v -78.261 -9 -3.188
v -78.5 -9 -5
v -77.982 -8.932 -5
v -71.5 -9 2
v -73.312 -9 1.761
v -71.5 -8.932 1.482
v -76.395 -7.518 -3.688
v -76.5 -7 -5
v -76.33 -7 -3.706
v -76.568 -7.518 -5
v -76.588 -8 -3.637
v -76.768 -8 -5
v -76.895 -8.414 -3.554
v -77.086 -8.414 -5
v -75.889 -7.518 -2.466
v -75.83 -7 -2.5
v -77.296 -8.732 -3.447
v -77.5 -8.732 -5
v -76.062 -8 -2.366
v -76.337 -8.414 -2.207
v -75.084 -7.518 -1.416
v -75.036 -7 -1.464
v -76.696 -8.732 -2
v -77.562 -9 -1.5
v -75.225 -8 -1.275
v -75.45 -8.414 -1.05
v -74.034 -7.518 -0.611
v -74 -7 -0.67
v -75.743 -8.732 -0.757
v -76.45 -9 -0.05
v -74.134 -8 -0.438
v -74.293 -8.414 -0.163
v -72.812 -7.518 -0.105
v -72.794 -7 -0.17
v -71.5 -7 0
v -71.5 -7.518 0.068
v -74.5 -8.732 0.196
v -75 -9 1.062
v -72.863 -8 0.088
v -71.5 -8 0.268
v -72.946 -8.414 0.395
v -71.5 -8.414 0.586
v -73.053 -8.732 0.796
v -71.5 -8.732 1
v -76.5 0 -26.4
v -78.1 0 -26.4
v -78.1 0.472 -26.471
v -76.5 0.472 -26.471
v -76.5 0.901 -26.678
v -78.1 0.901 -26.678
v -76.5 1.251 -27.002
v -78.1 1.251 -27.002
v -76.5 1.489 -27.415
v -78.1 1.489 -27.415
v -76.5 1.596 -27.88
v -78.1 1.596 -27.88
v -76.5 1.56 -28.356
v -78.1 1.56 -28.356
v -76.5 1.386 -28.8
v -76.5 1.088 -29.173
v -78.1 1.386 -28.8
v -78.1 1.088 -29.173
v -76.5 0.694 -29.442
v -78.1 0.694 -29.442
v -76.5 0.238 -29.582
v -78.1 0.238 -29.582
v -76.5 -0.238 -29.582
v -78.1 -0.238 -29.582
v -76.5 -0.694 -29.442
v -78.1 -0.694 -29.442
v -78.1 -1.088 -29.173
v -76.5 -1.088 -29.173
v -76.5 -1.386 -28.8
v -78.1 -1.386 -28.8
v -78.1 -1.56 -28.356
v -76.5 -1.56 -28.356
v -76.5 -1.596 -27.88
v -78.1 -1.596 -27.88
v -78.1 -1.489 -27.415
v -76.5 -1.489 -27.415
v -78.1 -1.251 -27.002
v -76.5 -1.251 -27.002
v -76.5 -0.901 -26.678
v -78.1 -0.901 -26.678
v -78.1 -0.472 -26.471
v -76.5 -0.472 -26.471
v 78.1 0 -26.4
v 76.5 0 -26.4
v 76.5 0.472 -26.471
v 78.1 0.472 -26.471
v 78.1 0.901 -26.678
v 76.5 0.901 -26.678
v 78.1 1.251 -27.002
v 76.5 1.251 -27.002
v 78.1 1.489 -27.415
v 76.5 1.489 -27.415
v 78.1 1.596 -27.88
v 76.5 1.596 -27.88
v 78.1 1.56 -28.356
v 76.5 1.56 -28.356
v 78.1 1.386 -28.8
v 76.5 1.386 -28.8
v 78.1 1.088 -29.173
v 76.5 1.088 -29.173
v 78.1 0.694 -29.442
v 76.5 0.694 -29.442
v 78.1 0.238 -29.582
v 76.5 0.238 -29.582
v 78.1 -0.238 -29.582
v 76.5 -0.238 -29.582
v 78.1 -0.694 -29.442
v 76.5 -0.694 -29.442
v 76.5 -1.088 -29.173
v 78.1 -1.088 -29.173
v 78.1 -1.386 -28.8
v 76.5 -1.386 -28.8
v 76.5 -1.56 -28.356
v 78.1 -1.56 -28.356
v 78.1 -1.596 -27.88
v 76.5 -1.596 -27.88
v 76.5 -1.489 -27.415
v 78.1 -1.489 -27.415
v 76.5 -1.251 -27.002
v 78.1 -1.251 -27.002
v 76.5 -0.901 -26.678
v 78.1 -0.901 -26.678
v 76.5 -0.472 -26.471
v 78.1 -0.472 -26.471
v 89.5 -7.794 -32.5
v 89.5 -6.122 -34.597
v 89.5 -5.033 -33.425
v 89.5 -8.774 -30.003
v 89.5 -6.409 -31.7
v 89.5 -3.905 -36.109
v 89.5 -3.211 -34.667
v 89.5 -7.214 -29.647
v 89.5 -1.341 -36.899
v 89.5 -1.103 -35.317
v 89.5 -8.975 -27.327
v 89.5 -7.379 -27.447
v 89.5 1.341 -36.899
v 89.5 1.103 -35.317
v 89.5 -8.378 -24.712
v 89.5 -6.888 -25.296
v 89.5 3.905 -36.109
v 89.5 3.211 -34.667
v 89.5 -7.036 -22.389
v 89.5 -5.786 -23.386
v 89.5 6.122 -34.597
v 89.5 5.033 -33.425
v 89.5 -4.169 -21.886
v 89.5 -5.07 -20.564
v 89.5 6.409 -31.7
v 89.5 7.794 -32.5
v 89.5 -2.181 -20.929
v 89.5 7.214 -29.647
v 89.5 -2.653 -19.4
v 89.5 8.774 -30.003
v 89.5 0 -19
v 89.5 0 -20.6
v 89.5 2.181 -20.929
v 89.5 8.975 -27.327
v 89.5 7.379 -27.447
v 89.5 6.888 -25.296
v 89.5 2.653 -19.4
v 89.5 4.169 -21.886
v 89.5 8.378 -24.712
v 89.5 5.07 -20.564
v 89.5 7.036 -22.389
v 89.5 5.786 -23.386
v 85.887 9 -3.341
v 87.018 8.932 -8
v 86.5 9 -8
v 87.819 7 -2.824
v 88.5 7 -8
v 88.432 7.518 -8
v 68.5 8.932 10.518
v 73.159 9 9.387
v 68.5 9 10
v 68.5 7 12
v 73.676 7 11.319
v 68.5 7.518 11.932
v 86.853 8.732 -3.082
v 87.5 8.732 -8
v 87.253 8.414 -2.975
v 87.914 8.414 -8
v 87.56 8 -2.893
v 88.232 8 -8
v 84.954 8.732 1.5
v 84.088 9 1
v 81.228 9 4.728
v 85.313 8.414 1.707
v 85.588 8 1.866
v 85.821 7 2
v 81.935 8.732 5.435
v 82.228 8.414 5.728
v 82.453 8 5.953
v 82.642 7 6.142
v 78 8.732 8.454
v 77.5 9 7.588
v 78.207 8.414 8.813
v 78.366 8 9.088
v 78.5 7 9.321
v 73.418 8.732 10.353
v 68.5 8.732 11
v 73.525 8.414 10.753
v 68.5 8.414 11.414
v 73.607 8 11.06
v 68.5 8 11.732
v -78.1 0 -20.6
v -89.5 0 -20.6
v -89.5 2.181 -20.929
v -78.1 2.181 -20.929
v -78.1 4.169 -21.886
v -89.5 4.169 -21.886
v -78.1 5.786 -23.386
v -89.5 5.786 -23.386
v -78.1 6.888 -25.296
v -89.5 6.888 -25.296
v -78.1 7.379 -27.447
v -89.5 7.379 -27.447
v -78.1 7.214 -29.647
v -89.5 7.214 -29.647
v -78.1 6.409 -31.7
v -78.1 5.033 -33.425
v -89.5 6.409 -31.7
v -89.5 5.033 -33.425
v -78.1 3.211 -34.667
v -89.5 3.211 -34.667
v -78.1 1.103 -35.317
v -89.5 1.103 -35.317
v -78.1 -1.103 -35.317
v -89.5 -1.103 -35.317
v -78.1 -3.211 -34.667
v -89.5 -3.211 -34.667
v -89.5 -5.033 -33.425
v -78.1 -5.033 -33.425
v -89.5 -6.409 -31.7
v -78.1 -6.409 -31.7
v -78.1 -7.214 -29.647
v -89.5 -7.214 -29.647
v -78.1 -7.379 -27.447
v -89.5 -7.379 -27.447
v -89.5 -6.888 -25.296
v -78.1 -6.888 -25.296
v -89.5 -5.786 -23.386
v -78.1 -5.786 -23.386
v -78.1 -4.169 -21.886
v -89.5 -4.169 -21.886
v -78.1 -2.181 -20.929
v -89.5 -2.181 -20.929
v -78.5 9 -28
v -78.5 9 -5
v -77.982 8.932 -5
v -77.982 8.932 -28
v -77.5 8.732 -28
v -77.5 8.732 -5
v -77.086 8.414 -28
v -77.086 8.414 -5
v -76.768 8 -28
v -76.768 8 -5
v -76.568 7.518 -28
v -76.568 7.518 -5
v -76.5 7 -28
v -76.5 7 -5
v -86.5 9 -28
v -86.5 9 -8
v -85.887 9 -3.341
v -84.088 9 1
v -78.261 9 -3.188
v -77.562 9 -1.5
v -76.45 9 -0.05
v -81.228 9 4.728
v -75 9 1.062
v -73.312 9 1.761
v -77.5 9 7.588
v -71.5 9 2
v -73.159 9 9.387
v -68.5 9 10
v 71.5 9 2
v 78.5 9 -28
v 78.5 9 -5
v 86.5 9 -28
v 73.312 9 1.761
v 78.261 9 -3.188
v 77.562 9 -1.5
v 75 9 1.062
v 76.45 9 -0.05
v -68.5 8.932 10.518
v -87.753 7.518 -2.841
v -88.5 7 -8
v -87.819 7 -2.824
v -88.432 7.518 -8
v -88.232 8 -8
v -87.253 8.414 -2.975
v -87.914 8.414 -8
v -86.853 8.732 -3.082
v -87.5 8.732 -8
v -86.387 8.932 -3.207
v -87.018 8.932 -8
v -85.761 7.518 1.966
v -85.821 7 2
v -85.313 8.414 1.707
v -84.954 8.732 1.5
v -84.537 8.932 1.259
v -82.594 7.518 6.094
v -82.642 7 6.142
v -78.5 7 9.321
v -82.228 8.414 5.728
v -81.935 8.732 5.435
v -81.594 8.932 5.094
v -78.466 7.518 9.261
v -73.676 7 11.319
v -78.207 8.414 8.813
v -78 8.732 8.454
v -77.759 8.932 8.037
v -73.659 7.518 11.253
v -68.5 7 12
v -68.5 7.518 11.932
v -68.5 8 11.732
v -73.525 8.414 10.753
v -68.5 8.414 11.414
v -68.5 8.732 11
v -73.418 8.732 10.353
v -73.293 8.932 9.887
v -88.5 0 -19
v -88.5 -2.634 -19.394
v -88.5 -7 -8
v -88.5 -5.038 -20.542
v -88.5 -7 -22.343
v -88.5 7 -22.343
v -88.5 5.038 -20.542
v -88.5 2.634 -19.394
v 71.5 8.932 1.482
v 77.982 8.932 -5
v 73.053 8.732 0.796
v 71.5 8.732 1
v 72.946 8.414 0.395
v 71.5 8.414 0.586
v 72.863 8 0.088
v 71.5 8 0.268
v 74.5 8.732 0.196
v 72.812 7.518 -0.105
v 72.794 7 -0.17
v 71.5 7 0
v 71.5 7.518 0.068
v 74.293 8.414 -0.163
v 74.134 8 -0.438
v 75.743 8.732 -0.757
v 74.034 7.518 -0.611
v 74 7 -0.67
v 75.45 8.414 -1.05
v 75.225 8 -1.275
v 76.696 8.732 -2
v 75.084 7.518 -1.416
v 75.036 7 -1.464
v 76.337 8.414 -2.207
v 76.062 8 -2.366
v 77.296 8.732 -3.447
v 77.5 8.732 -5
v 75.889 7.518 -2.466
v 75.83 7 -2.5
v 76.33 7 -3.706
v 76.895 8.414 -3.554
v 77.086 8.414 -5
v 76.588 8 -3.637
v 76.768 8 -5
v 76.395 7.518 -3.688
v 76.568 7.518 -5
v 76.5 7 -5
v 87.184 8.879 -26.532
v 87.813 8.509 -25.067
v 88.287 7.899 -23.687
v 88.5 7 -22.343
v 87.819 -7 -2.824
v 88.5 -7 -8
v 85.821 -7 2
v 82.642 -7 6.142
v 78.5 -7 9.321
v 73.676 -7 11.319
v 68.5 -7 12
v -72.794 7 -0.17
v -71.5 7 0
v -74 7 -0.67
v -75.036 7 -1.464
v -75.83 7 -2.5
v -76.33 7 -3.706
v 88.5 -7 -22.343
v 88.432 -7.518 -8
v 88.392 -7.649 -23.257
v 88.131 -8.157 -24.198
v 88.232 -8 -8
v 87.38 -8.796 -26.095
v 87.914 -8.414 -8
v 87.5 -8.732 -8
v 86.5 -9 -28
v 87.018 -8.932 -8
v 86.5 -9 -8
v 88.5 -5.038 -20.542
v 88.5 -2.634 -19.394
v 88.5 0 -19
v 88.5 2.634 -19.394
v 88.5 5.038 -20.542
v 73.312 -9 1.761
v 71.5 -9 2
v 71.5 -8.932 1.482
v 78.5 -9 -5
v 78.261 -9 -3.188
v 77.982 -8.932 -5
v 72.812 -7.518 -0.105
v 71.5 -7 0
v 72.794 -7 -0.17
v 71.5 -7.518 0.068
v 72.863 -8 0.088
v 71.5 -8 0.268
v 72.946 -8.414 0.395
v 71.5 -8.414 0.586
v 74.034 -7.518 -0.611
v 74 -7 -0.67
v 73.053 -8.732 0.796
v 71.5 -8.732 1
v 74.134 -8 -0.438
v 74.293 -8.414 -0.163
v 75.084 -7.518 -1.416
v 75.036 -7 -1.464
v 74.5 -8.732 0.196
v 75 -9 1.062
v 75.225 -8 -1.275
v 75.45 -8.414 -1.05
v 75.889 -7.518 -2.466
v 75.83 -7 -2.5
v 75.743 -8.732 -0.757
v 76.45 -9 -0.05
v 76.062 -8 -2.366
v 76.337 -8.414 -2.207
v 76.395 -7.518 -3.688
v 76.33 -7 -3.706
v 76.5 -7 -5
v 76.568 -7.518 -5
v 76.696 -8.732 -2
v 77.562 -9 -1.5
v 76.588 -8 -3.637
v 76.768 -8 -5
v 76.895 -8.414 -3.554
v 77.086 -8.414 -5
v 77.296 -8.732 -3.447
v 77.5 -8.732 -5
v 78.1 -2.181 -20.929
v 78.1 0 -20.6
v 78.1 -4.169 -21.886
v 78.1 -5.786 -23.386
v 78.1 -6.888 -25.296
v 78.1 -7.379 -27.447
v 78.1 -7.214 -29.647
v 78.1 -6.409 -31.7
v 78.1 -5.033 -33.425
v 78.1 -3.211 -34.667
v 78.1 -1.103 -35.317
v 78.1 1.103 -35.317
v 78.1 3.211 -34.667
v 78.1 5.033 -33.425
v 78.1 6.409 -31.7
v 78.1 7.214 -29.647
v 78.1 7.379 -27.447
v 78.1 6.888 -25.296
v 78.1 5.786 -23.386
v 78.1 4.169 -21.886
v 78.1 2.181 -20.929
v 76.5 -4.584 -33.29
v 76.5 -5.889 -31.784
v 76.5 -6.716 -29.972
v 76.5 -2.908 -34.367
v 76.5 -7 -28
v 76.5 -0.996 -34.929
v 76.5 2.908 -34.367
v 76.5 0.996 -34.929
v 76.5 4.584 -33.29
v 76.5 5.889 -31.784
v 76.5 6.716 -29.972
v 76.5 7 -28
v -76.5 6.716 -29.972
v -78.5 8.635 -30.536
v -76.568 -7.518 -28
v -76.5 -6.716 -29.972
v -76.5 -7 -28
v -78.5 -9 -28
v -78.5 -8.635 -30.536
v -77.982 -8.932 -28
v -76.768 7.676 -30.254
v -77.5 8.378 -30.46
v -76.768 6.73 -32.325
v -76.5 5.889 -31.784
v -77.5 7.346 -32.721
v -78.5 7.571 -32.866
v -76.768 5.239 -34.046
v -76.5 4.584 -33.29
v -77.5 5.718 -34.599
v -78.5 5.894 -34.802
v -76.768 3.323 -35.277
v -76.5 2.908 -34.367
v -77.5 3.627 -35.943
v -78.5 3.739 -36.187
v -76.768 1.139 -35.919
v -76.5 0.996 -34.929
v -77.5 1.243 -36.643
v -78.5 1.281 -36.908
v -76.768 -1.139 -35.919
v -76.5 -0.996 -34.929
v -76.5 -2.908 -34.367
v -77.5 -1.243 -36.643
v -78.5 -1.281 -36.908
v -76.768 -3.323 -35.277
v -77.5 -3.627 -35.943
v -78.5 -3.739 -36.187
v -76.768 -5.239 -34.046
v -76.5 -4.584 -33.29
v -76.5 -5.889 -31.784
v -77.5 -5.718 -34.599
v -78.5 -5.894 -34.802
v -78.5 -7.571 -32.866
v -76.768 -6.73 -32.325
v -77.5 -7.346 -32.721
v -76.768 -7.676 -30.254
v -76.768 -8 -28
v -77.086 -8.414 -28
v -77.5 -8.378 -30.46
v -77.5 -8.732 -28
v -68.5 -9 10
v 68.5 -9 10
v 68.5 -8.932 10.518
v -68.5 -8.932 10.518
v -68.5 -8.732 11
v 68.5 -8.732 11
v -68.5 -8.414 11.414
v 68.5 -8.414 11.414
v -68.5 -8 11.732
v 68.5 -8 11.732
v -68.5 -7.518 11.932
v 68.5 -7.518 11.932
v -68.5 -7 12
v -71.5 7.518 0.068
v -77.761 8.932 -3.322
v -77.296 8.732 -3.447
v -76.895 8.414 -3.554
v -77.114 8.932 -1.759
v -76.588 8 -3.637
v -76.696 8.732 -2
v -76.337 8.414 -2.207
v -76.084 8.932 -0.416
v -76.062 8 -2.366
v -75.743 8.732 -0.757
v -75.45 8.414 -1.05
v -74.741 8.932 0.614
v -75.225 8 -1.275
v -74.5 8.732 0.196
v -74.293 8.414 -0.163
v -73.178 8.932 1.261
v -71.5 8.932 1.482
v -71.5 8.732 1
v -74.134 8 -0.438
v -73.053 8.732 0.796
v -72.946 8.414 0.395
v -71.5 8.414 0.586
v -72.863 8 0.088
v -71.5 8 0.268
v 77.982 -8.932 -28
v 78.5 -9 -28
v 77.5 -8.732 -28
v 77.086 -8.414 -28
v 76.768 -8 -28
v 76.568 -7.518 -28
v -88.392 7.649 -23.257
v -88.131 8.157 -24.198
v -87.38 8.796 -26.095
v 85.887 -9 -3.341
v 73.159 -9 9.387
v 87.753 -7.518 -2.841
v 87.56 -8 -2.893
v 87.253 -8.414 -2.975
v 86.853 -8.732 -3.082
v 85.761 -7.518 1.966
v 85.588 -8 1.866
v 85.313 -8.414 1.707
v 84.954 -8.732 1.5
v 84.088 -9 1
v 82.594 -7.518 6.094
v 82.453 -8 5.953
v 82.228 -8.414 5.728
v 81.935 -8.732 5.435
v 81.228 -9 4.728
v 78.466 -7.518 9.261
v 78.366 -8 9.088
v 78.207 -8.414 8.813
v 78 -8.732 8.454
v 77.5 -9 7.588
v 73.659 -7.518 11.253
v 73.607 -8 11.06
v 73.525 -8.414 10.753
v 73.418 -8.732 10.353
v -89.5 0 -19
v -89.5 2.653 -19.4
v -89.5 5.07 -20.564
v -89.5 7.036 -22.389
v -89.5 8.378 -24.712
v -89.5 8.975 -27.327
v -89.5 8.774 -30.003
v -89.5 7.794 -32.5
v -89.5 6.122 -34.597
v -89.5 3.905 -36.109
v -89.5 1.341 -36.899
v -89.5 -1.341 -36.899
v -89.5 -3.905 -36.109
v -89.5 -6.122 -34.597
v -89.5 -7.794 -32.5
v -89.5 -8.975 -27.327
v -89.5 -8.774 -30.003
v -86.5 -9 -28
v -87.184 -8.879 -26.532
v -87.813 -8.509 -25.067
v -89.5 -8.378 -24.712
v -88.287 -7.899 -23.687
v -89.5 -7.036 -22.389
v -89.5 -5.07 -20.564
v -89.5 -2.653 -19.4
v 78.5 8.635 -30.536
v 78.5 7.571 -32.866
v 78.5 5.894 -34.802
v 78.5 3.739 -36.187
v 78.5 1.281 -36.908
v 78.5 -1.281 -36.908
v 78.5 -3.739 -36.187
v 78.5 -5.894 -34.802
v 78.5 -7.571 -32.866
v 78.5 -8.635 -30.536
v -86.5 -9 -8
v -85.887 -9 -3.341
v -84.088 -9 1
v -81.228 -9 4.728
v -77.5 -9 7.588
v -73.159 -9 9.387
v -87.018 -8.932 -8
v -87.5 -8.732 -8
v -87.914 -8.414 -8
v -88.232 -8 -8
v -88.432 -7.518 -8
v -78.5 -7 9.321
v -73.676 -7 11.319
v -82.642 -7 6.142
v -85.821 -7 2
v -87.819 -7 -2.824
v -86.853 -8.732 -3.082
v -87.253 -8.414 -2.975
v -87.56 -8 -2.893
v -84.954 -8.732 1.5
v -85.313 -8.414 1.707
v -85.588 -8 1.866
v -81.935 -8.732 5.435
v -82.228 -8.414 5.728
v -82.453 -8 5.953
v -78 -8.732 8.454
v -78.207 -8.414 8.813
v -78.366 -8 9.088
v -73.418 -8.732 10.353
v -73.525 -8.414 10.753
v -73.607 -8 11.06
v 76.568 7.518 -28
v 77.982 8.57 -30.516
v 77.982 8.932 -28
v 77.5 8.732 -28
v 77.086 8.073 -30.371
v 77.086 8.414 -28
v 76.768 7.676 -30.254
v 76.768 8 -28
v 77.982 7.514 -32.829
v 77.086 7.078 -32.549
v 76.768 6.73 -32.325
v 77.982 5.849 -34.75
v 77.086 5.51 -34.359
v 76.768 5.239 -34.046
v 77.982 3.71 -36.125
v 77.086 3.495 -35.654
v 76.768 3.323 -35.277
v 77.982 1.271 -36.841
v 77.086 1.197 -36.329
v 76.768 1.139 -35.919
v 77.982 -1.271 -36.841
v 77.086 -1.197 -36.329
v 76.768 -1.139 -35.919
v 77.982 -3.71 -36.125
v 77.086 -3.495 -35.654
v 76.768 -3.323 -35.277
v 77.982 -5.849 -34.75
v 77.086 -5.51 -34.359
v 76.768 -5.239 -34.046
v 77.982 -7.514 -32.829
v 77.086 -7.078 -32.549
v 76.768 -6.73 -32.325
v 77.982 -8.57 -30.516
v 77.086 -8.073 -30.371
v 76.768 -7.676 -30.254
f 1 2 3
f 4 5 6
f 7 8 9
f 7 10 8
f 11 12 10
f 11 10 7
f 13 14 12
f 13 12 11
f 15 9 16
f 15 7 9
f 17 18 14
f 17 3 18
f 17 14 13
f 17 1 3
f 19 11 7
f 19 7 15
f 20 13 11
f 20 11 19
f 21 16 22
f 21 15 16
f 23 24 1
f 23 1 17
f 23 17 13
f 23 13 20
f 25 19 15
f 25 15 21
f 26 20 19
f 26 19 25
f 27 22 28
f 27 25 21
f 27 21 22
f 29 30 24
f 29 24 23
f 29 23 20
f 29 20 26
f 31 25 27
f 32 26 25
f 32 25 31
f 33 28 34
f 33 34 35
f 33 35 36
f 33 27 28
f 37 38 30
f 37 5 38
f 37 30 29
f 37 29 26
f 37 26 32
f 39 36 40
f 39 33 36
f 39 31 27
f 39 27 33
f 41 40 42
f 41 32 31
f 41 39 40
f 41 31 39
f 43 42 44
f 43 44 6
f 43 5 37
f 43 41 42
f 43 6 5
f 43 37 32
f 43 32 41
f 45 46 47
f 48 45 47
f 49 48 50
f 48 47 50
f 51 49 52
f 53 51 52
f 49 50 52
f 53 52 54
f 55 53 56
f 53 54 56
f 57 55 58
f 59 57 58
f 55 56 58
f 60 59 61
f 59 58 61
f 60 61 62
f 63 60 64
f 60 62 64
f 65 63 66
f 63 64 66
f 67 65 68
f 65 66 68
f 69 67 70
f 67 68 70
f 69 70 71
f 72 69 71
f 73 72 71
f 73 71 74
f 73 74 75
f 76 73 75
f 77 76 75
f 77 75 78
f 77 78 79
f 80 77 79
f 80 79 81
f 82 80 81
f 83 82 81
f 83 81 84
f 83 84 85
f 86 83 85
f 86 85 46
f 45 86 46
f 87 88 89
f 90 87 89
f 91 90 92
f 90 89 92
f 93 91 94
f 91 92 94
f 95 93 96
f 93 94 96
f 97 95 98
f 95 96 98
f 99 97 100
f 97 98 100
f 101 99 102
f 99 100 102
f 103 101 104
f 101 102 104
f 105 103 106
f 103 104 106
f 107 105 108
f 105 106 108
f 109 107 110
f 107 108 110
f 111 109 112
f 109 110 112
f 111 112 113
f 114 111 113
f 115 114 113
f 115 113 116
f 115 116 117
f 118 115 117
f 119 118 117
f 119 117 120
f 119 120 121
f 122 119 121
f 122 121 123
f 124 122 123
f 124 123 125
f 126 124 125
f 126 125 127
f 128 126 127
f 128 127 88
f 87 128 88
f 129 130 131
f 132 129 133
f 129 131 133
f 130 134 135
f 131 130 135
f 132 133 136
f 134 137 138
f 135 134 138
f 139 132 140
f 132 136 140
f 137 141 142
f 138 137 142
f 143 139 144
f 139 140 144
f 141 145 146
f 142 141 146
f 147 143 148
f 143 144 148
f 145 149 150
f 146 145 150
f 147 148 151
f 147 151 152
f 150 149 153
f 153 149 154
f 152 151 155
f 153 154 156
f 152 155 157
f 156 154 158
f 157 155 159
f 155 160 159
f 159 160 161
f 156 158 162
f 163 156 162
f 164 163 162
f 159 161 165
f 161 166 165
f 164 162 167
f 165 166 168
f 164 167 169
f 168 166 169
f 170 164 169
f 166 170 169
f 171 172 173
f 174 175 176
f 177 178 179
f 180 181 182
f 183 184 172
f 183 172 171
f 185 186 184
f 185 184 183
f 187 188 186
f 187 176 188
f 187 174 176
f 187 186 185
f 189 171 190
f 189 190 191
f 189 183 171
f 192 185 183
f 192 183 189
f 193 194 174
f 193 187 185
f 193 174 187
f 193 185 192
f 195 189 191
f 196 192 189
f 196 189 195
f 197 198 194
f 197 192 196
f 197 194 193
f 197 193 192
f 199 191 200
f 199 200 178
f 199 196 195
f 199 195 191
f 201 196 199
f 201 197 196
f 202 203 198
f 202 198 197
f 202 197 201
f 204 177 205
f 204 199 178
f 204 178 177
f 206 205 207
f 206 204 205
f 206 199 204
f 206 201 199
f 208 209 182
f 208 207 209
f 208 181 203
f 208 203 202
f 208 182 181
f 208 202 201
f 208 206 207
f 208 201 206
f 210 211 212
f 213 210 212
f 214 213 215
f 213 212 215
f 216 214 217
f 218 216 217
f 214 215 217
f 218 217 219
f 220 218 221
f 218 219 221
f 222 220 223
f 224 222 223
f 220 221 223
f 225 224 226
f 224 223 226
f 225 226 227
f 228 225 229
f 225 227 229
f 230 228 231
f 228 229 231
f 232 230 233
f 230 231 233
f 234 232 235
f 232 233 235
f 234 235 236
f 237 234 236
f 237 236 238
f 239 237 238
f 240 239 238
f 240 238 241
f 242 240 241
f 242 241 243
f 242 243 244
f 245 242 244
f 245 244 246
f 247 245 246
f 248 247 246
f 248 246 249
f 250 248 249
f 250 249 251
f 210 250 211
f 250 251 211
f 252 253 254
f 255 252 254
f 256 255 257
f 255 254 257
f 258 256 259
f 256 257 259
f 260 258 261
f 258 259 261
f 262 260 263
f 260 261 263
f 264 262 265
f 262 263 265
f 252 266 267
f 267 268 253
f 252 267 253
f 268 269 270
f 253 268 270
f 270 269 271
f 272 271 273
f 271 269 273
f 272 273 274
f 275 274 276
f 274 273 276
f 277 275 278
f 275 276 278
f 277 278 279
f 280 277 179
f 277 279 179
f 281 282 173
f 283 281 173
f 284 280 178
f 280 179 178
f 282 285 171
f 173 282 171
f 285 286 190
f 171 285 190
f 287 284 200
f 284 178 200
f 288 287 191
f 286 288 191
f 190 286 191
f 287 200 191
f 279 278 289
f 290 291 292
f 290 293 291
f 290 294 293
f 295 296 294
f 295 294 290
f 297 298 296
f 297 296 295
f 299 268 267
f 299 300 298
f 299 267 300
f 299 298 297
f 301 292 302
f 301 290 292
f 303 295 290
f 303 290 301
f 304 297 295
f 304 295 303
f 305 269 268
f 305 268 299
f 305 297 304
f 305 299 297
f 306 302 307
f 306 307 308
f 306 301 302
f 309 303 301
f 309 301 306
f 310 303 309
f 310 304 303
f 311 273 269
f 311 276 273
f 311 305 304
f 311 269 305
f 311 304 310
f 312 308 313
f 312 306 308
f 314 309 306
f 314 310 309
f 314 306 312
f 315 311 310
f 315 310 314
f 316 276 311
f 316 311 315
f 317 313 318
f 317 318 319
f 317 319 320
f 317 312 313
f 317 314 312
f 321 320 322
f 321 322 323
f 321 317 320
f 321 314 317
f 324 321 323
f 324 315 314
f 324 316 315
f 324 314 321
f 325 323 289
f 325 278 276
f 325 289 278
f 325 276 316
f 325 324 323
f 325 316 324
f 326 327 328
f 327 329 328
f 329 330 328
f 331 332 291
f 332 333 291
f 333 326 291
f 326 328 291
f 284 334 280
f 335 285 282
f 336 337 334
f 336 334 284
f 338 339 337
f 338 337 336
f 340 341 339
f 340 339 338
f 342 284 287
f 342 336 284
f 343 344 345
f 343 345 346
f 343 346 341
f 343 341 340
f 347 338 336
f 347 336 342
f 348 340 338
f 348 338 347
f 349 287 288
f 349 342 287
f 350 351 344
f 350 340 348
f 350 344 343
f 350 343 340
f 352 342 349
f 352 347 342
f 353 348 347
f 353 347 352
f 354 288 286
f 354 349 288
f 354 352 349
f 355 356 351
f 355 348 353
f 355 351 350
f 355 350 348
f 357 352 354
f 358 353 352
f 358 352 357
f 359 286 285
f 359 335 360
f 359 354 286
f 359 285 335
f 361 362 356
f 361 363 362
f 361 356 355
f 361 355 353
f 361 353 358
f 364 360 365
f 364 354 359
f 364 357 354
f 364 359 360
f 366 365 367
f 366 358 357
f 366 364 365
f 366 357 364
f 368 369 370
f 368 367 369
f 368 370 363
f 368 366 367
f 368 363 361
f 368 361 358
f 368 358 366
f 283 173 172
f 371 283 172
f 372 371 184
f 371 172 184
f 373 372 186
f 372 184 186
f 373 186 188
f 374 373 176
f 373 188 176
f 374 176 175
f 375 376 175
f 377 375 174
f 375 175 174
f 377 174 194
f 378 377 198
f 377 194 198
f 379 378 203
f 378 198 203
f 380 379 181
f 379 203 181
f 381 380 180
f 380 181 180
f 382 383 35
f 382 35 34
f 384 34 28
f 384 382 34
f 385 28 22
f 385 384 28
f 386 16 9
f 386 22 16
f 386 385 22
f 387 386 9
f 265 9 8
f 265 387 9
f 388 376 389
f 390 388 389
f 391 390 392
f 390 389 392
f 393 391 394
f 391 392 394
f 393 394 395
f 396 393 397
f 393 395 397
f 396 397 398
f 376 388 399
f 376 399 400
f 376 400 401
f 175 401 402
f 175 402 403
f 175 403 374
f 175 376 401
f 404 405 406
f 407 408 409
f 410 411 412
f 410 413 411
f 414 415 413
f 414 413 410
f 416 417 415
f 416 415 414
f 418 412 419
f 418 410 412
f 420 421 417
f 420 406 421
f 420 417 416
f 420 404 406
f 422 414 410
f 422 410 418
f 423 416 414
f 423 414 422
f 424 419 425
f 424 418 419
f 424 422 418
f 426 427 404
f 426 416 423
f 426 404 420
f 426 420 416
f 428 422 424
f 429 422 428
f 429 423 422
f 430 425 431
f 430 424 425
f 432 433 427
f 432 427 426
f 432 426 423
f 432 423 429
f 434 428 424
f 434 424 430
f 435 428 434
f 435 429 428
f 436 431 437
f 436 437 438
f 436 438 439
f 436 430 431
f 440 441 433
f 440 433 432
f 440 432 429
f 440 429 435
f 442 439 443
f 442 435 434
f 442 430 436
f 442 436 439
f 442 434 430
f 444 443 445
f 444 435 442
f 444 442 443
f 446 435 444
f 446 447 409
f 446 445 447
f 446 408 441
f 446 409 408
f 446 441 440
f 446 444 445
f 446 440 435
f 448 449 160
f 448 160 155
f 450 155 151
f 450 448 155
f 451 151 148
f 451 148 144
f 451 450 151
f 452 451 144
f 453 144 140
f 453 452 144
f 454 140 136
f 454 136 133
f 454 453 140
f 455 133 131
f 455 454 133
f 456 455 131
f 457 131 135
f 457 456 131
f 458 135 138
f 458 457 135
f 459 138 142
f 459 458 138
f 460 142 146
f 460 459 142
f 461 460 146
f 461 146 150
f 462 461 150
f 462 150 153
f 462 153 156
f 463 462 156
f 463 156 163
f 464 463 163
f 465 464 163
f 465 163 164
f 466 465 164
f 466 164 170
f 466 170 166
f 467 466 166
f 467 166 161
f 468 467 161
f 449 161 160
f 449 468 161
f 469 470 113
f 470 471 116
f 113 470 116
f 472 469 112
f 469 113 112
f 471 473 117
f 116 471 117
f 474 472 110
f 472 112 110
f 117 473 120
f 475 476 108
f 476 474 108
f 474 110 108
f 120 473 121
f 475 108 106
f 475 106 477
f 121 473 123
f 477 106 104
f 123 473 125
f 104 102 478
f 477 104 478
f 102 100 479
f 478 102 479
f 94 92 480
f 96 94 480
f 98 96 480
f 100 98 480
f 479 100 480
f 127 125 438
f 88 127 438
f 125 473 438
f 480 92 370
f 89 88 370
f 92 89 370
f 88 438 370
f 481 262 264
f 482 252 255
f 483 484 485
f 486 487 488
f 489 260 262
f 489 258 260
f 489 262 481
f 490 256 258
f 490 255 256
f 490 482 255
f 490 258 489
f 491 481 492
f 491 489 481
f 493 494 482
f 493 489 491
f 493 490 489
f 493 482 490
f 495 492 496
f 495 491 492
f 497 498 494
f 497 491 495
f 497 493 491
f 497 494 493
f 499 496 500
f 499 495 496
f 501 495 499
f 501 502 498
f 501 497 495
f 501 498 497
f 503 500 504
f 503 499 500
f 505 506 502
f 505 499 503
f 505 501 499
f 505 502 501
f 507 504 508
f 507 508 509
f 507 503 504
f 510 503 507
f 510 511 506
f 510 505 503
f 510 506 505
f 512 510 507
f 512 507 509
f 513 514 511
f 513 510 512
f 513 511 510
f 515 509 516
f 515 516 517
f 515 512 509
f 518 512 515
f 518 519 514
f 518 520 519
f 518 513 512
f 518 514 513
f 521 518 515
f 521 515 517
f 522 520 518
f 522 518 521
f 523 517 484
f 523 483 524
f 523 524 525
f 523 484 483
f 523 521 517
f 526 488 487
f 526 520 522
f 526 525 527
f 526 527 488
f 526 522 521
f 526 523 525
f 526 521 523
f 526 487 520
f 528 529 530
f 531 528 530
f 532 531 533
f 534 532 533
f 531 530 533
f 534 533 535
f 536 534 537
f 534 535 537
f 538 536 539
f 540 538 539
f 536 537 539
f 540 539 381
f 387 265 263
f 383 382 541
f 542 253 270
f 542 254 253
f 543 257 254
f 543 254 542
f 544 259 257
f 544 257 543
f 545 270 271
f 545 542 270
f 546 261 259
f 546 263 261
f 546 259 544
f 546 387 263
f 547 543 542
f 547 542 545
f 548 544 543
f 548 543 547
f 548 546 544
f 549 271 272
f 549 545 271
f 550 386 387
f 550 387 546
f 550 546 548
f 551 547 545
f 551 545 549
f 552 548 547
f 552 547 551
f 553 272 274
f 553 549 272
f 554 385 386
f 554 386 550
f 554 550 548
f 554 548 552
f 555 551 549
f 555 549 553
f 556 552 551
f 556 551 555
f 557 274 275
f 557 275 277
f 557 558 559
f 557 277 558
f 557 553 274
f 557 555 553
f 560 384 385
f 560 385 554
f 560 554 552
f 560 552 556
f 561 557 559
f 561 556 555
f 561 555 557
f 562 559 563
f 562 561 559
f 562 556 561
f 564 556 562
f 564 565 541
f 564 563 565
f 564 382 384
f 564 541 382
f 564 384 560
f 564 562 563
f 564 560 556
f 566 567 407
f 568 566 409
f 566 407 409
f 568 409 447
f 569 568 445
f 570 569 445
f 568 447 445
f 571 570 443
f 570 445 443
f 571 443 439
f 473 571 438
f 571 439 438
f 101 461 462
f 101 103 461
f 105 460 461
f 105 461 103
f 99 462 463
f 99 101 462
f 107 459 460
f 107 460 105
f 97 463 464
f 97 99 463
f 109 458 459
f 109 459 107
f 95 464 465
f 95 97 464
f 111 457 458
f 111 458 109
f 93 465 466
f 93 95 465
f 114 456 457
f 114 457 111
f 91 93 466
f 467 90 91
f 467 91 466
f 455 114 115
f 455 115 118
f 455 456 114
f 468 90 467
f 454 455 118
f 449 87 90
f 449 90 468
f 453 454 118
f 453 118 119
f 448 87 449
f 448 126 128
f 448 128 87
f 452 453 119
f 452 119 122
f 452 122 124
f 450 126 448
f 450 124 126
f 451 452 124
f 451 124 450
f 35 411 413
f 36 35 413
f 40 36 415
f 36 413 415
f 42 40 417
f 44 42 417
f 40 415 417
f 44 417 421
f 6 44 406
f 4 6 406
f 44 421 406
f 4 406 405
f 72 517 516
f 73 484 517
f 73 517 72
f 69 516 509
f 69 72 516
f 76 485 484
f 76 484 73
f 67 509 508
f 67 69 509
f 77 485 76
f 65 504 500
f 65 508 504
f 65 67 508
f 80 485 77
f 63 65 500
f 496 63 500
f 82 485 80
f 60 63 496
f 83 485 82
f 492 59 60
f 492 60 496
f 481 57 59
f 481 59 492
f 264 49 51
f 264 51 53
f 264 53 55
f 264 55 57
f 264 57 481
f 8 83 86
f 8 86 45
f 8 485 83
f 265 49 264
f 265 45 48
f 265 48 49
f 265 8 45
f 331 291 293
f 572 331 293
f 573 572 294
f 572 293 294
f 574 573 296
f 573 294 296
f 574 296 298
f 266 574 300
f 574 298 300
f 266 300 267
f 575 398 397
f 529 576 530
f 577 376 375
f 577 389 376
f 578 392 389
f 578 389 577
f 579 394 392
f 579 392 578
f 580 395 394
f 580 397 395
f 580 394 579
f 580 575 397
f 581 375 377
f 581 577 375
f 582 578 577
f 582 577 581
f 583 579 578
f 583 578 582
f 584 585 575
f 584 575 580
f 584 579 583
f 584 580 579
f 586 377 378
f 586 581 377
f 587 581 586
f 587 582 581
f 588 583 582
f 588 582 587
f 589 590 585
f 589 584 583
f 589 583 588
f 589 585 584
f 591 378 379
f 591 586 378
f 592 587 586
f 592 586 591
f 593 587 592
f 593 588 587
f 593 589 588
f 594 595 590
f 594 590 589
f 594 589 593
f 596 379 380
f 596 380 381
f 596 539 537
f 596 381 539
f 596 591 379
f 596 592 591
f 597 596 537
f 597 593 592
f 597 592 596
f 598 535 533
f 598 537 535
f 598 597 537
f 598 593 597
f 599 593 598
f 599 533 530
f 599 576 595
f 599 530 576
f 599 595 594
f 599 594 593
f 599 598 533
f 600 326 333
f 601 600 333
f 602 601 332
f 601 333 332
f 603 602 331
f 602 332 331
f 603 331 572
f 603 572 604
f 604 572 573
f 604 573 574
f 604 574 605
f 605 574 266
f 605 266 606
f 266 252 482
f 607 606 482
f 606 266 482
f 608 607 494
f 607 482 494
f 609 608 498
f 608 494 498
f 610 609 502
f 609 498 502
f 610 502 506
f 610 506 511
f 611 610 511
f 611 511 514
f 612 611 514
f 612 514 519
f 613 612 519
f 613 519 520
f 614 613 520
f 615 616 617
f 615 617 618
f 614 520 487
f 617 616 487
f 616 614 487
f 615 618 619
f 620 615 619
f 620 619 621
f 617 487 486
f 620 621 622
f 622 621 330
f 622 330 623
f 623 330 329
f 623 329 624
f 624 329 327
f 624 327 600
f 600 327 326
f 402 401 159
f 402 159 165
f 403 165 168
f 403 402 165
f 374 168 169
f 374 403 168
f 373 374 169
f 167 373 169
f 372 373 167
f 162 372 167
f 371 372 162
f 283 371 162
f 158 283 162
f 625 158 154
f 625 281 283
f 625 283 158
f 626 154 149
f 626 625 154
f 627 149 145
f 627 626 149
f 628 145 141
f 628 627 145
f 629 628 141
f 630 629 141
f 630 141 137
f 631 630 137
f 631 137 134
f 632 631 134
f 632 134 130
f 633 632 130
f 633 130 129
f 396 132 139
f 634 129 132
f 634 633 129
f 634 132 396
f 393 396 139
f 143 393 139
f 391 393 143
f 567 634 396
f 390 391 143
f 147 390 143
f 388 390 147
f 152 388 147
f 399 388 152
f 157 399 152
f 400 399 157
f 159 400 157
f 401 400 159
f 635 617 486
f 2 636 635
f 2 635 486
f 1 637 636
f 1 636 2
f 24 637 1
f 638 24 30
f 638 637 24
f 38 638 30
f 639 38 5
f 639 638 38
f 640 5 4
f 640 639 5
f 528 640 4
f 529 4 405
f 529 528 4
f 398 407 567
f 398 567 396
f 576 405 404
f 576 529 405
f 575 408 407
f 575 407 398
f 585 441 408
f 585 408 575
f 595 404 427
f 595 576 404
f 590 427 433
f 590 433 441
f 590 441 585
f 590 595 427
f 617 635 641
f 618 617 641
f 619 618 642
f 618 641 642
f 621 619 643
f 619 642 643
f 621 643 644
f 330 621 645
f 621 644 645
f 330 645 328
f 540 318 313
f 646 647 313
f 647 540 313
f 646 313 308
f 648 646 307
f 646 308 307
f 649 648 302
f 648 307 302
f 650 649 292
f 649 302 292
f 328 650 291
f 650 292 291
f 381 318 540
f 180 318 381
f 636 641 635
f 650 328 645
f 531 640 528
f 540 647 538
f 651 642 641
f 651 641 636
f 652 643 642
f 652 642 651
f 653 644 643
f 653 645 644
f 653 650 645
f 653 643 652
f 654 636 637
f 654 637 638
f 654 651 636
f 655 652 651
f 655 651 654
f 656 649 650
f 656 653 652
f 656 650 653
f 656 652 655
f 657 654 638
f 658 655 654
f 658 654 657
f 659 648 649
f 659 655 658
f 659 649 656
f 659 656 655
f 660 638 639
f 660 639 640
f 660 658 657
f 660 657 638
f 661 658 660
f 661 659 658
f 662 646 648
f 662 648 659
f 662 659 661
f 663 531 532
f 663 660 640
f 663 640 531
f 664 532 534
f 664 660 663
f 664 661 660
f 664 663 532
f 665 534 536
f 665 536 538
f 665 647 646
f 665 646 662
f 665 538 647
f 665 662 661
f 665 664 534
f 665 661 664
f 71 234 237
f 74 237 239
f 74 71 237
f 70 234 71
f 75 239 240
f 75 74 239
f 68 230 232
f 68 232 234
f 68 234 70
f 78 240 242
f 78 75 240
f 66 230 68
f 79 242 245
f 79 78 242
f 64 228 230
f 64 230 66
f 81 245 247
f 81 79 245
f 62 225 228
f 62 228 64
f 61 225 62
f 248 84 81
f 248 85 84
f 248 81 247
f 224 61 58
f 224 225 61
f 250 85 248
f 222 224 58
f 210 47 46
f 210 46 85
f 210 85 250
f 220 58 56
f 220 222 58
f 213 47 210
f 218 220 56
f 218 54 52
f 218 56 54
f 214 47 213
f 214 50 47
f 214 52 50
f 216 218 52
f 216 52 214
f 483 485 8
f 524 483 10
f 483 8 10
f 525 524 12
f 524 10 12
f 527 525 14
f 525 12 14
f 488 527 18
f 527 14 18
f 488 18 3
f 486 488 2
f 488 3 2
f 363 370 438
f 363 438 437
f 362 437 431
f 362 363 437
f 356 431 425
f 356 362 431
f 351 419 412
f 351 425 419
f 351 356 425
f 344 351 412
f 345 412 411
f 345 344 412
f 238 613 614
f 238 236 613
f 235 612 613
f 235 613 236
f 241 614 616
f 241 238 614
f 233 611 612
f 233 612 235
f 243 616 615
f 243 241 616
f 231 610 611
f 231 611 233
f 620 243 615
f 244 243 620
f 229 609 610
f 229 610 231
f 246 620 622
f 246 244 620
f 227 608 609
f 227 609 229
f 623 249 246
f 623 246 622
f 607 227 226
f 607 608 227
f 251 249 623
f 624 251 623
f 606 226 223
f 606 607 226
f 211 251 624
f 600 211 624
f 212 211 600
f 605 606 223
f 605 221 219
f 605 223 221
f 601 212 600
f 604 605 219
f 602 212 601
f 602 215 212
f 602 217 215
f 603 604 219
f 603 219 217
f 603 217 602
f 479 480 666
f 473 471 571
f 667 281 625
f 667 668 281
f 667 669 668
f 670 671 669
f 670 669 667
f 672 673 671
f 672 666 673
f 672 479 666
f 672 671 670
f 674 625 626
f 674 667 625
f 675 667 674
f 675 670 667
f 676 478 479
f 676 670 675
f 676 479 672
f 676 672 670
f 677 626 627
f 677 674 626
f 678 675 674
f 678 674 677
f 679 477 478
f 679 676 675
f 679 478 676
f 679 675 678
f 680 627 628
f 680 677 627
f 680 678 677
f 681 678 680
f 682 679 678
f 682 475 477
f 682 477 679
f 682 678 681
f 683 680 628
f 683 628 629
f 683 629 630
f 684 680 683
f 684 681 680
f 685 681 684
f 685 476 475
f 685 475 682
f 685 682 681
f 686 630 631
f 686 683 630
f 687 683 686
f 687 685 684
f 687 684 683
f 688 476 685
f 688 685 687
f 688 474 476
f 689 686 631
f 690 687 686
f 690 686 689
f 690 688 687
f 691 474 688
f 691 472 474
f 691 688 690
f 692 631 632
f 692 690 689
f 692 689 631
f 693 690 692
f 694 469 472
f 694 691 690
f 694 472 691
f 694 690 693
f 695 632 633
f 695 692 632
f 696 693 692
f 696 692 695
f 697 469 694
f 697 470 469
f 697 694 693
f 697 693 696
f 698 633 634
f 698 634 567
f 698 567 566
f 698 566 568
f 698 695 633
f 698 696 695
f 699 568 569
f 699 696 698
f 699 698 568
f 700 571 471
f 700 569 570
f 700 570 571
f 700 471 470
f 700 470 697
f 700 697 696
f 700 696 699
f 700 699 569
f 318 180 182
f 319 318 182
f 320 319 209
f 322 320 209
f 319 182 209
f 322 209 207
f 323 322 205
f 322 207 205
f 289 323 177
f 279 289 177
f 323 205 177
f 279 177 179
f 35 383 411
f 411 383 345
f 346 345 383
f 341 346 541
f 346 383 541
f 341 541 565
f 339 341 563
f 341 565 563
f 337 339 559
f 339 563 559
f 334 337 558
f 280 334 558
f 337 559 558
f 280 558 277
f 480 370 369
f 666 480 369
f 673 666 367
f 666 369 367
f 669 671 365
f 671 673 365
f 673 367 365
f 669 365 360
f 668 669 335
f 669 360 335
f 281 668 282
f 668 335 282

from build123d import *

# Parameters (mm, degrees)
SKETCH1_W           = 153
SKETCH1_H           = 18
BOSS_EXTRUDE1_DEPTH = 12
BOSS_EXTRUDE2_START = -12
SKETCH2_W           = 12
SKETCH2_H           = 18
BOSS_EXTRUDE2_DEPTH = 40
BOSS_EXTRUDE3_START = -12
SKETCH3_R           = 9
BOSS_EXTRUDE3_DEPTH = 13
SKETCH4_R           = 7.4
CUT_EXTRUDE1_DEPTH  = 11.4
SKETCH5_R           = 1.6
CUT_EXTRUDE2_DEPTH  = 172.871347234
CUT_EXTRUDE4_START  = -11.4
SKETCH9_R           = 7.4
CUT_EXTRUDE4_DEPTH  = 11.4
FILLET1_R           = 20
FILLET2_R           = 5
FILLET3_R           = 2


with BuildPart() as part:
    # Sketch1 → Boss-Extrude1 (new body)
    with BuildSketch(Plane.XY):
        Rectangle(SKETCH1_W, SKETCH1_H)
    extrude(amount=BOSS_EXTRUDE1_DEPTH)

    # Sketch2 → Boss-Extrude2 (add)
    with BuildSketch(Plane(origin=(0, 0, 0), x_dir=(-1, 0, 0), z_dir=(0, 0, -1)).offset(BOSS_EXTRUDE2_START)):
        with Locations((82.5, 0)):
            Rectangle(SKETCH2_W, SKETCH2_H)
    boss_extrude2 = extrude(amount=BOSS_EXTRUDE2_DEPTH)

    # Sketch3 → Boss-Extrude3 (add)
    with BuildSketch(Plane.ZY.offset(88.5).offset(BOSS_EXTRUDE3_START)):
        with Locations((-28, 0)):
            Circle(SKETCH3_R)
    boss_extrude3 = extrude(amount=BOSS_EXTRUDE3_DEPTH)

    # Mirror1: Boss-Extrude2, Boss-Extrude3 across plane
    add(boss_extrude2.mirror(Plane(origin=(0, 0, 0), x_dir=(0, 0, 1), z_dir=(1, 0, 0))))
    add(boss_extrude3.mirror(Plane(origin=(0, 0, 0), x_dir=(0, 0, 1), z_dir=(1, 0, 0))))

    # Sketch4 → Cut-Extrude1 (cut)
    with BuildSketch(Plane.ZY.offset(89.5)):
        with Locations((-28, 0)):
            Circle(SKETCH4_R)
    extrude(amount=-CUT_EXTRUDE1_DEPTH, mode=Mode.SUBTRACT)

    # Sketch5 → Cut-Extrude2 (cut, through all)
    with BuildSketch(Plane.ZY.offset(78.1)):
        with Locations((-28, 0)):
            Circle(SKETCH5_R)
    extrude(amount=-CUT_EXTRUDE2_DEPTH, mode=Mode.SUBTRACT)

    # Sketch9 → Cut-Extrude4 (cut)
    with BuildSketch(Plane(origin=(89.5, 0, 0), x_dir=(0, 0, -1), z_dir=(1, 0, 0)).offset(CUT_EXTRUDE4_START)):
        with Locations(Location((28, 0, 0), (0, 0, 180))):
            Circle(SKETCH9_R)
    extrude(amount=CUT_EXTRUDE4_DEPTH, mode=Mode.SUBTRACT)

    # Fillet1
    fillet1_edges = [part.edges().sort_by_distance(p)[0] for p in [
        (-88.5, 0, 12),
        (88.5, 0, 12),
    ]]
    fillet(fillet1_edges, radius=FILLET1_R)

    # Fillet2
    fillet2_edges = [part.edges().sort_by_distance(p)[0] for p in [
        (76.5, 0, 0),
        (-76.5, 0, 0),
    ]]
    fillet(fillet2_edges, radius=FILLET2_R)

    # Fillet3
    # the kernel refuses this fillet: 2 mm, written as the material it takes off along each edge
    with BuildSketch(Plane(origin=(-76.5, 0, -28), x_dir=(0, 1, 0), z_dir=(0, 0, 1))) as fillet3_piece_1:
        with BuildLine():
            CenterArc((9 - FILLET3_R, FILLET3_R), FILLET3_R, 270, 90)
            Line((9, FILLET3_R), (9, 0))
            Line((9, 0), (9 - FILLET3_R, 0))
        make_face()
    revolve(axis=Axis((-76.5, 0, -28), (-1, 0, 0)), revolution_arc=180, mode=Mode.SUBTRACT)
    with BuildSketch(Plane(origin=(76.5, 0, -28), x_dir=(0, 1, 0), z_dir=(0, 0, 1))) as fillet3_piece_2:
        with BuildLine():
            CenterArc((9 - FILLET3_R, -FILLET3_R), FILLET3_R, 0, 90)
            Line((9, -FILLET3_R), (9, 0))
            Line((9, 0), (9 - FILLET3_R, 0))
        make_face()
    revolve(axis=Axis((76.5, 0, -28), (-1, 0, 0)), revolution_arc=180, mode=Mode.SUBTRACT)
    with BuildSketch(Plane(origin=(68.5, 9, 12), x_dir=(0, -1, 0), z_dir=(-1, 0, 0)), Plane(origin=(68.5, -9, 12), x_dir=(0, 0, -1), z_dir=(-1, 0, 0))) as fillet3_piece_3:
        with BuildLine():
            CenterArc((FILLET3_R, -FILLET3_R), FILLET3_R, 90, 90)
            Line((0, -FILLET3_R), (0, 0))
            Line((0, 0), (FILLET3_R, 0))
        make_face()
    extrude(amount=137, mode=Mode.SUBTRACT)
    with BuildSketch(Plane(origin=(-88.5, 9, -8), x_dir=(0, -1, 0), z_dir=(0, 0, -1))) as fillet3_piece_4_section:
        with BuildLine():
            CenterArc((FILLET3_R, -FILLET3_R), FILLET3_R, 90, 90)
            Line((0, -FILLET3_R), (0, 0))
            Line((0, 0), (FILLET3_R, 0))
        make_face()
    fillet3_piece_4 = extrude(amount=25, mode=Mode.PRIVATE)
    fillet3_piece_4 = fillet3_piece_4 - Plane(origin=(-88.080537714, 0, -28), x_dir=(0, 0, 1), z_dir=(1, 0, 0)) * Cylinder(9, 59, mode=Mode.PRIVATE)
    add(fillet3_piece_4, mode=Mode.SUBTRACT)
    with BuildSketch(Plane(origin=(88.5, 9, -8), x_dir=(0, -1, 0), z_dir=(0, 0, -1))) as fillet3_piece_5_section:
        with BuildLine():
            CenterArc((FILLET3_R, FILLET3_R), FILLET3_R, 180, 90)
            Line((0, FILLET3_R), (0, 0))
            Line((0, 0), (FILLET3_R, 0))
        make_face()
    fillet3_piece_5 = extrude(amount=25, mode=Mode.PRIVATE)
    fillet3_piece_5 = fillet3_piece_5 - Plane(origin=(88.080537714, 0, -28), x_dir=(0, 0, 1), z_dir=(-1, 0, 0)) * Cylinder(9, 59, mode=Mode.PRIVATE)
    add(fillet3_piece_5, mode=Mode.SUBTRACT)
    with BuildSketch(Plane(origin=(-68.5, 9, -8), x_dir=(-1, 0, 0), z_dir=(0, 0, -1))) as fillet3_piece_6:
        with BuildLine():
            CenterArc((20 - FILLET3_R, -FILLET3_R), FILLET3_R, 0, 90)
            Line((20 - FILLET3_R, 0), (20, 0))
            Line((20, 0), (20, -FILLET3_R))
        make_face()
    revolve(axis=Axis((-68.5, 9, -8), (0, 1, 0)), revolution_arc=90, mode=Mode.SUBTRACT)
    with BuildSketch(Plane(origin=(68.5, 9, -8), x_dir=(1, 0, 0), z_dir=(0, 0, -1))) as fillet3_piece_7:
        with BuildLine():
            CenterArc((20 - FILLET3_R, FILLET3_R), FILLET3_R, 270, 90)
            Line((20 - FILLET3_R, 0), (20, 0))
            Line((20, 0), (20, FILLET3_R))
        make_face()
    revolve(axis=Axis((68.5, 9, -8), (0, -1, 0)), revolution_arc=90, mode=Mode.SUBTRACT)
    with BuildSketch(Plane(origin=(88.5, -9, -8), x_dir=(-1, 0, 0), z_dir=(0, 0, -1))) as fillet3_piece_8_section:
        with BuildLine():
            CenterArc((FILLET3_R, FILLET3_R), FILLET3_R, 180, 90)
            Line((0, FILLET3_R), (0, 0))
            Line((0, 0), (FILLET3_R, 0))
        make_face()
    fillet3_piece_8 = extrude(amount=25, mode=Mode.PRIVATE)
    fillet3_piece_8 = fillet3_piece_8 - Plane(origin=(87.881585808, 0, -28), x_dir=(0, 0, 1), z_dir=(-1, 0, 0)) * Cylinder(9, 59, mode=Mode.PRIVATE)
    add(fillet3_piece_8, mode=Mode.SUBTRACT)
    with BuildSketch(Plane(origin=(-88.5, -9, -8), x_dir=(1, 0, 0), z_dir=(0, 0, -1))) as fillet3_piece_9_section:
        with BuildLine():
            CenterArc((FILLET3_R, -FILLET3_R), FILLET3_R, 90, 90)
            Line((0, -FILLET3_R), (0, 0))
            Line((0, 0), (FILLET3_R, 0))
        make_face()
    fillet3_piece_9 = extrude(amount=25, mode=Mode.PRIVATE)
    fillet3_piece_9 = fillet3_piece_9 - Plane(origin=(-87.881599188, 0, -28), x_dir=(0, 0, 1), z_dir=(1, 0, 0)) * Cylinder(9, 59, mode=Mode.PRIVATE)
    add(fillet3_piece_9, mode=Mode.SUBTRACT)
    with BuildSketch(Plane(origin=(-68.5, -9, -8), x_dir=(-1, 0, 0), z_dir=(0, 0, -1))) as fillet3_piece_10:
        with BuildLine():
            CenterArc((20 - FILLET3_R, FILLET3_R), FILLET3_R, 270, 90)
            Line((20, FILLET3_R), (20, 0))
            Line((20, 0), (20 - FILLET3_R, 0))
        make_face()
    revolve(axis=Axis((-68.5, -9, -8), (0, 1, 0)), revolution_arc=90, mode=Mode.SUBTRACT)
    with BuildSketch(Plane(origin=(68.5, -9, -8), x_dir=(1, 0, 0), z_dir=(0, 0, -1))) as fillet3_piece_11:
        with BuildLine():
            CenterArc((20 - FILLET3_R, -FILLET3_R), FILLET3_R, 0, 90)
            Line((20, -FILLET3_R), (20, 0))
            Line((20, 0), (20 - FILLET3_R, 0))
        make_face()
    revolve(axis=Axis((68.5, -9, -8), (0, -1, 0)), revolution_arc=90, mode=Mode.SUBTRACT)
    with BuildSketch(Plane(origin=(-76.5, -9, -5), x_dir=(-1, 0, 0), z_dir=(0, 0, -1)), Plane(origin=(-76.5, 9, -5), x_dir=(0, -1, 0), z_dir=(0, 0, -1))) as fillet3_piece_12:
        with BuildLine():
            CenterArc((FILLET3_R, FILLET3_R), FILLET3_R, 180, 90)
            Line((0, FILLET3_R), (0, 0))
            Line((0, 0), (FILLET3_R, 0))
        make_face()
    extrude(amount=23, mode=Mode.SUBTRACT)
    with BuildSketch(Plane(origin=(-71.5, 9, 0), x_dir=(0, -1, 0), z_dir=(1, 0, 0))) as fillet3_piece_13:
        with BuildLine():
            CenterArc((FILLET3_R, -FILLET3_R), FILLET3_R, 90, 90)
            Line((0, -FILLET3_R), (0, 0))
            Line((0, 0), (FILLET3_R, 0))
        make_face()
    extrude(amount=143, mode=Mode.SUBTRACT)
    with BuildSketch(Plane(origin=(71.5, -9, 0), x_dir=(0, 0, 1), z_dir=(-1, 0, 0))) as fillet3_piece_14:
        with BuildLine():
            CenterArc((FILLET3_R, FILLET3_R), FILLET3_R, 180, 90)
            Line((0, FILLET3_R), (0, 0))
            Line((0, 0), (FILLET3_R, 0))
        make_face()
    extrude(amount=143, mode=Mode.SUBTRACT)
    with BuildSketch(Plane(origin=(76.5, 9, -5), x_dir=(0, -1, 0), z_dir=(0, 0, -1)), Plane(origin=(76.5, -9, -5), x_dir=(1, 0, 0), z_dir=(0, 0, -1))) as fillet3_piece_15:
        with BuildLine():
            CenterArc((FILLET3_R, -FILLET3_R), FILLET3_R, 90, 90)
            Line((0, -FILLET3_R), (0, 0))
            Line((0, 0), (FILLET3_R, 0))
        make_face()
    extrude(amount=23, mode=Mode.SUBTRACT)
    with BuildSketch(Plane(origin=(-71.5, -9, -5), x_dir=(-1, 0, 0), z_dir=(0, 0, -1))) as fillet3_piece_16:
        with BuildLine():
            CenterArc((5 + FILLET3_R, FILLET3_R), FILLET3_R, 180, 90)
            Line((5, FILLET3_R), (5, 0))
            Line((5, 0), (5 + FILLET3_R, 0))
        make_face()
    revolve(axis=Axis((-71.5, -9, -5), (0, 1, 0)), revolution_arc=90, mode=Mode.SUBTRACT)
    with BuildSketch(Plane(origin=(-71.5, 9, -5), x_dir=(-1, 0, 0), z_dir=(0, 0, -1))) as fillet3_piece_17:
        with BuildLine():
            CenterArc((5 + FILLET3_R, -FILLET3_R), FILLET3_R, 90, 90)
            Line((5 + FILLET3_R, 0), (5, 0))
            Line((5, 0), (5, -FILLET3_R))
        make_face()
    revolve(axis=Axis((-71.5, 9, -5), (0, 1, 0)), revolution_arc=90, mode=Mode.SUBTRACT)
    with BuildSketch(Plane(origin=(71.5, 9, -5), x_dir=(0, 0, 1), z_dir=(-1, 0, 0))) as fillet3_piece_18:
        with BuildLine():
            CenterArc((5 + FILLET3_R, -FILLET3_R), FILLET3_R, 90, 90)
            Line((5 + FILLET3_R, 0), (5, 0))
            Line((5, 0), (5, -FILLET3_R))
        make_face()
    revolve(axis=Axis((71.5, 9, -5), (0, 1, 0)), revolution_arc=90, mode=Mode.SUBTRACT)
    with BuildSketch(Plane(origin=(71.5, -9, -5), x_dir=(0, 0, 1), z_dir=(-1, 0, 0))) as fillet3_piece_19:
        with BuildLine():
            CenterArc((5 + FILLET3_R, FILLET3_R), FILLET3_R, 180, 90)
            Line((5, FILLET3_R), (5, 0))
            Line((5, 0), (5 + FILLET3_R, 0))
        make_face()
    revolve(axis=Axis((71.5, -9, -5), (0, 1, 0)), revolution_arc=90, mode=Mode.SUBTRACT)


solid = part.part
